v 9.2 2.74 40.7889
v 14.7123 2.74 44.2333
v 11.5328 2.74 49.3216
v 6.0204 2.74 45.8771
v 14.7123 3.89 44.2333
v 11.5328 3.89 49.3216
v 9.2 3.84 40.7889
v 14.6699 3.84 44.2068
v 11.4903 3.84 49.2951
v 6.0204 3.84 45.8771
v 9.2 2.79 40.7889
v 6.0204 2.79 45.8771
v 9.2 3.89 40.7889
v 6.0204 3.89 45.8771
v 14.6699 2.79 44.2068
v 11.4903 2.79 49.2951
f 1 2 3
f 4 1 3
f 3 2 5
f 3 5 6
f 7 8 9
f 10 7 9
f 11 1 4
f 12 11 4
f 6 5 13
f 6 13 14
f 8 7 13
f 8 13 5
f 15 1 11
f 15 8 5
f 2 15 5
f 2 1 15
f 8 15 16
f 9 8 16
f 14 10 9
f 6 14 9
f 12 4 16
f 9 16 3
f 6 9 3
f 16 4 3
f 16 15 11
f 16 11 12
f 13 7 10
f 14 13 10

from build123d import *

# Parameters (mm, degrees)
BOX163_W               = 6
BOX163_H               = 6.45
BOX163_DEPTH           = 1.05
BOX162_W               = 6
BOX162_H               = 6.5
BOX162_DEPTH           = 1.15
CUT079_ROLL_ANGLE      = 90
CUT079_PITCH_ANGLE     = -58
CUT079_PLACEMENT_ANGLE = 180


with BuildPart() as small_cu_gnd_electrode068:
    # Box163 → Box163 (new body)
    with BuildSketch(Plane.XY.offset(0.05)):
        with Locations((3, 3.225)):
            Rectangle(BOX163_W, BOX163_H)
    extrude(amount=BOX163_DEPTH)


with BuildPart() as small_cu_electrode002_short_axis_gnd007:
    # Box162 → Box162 (new body)
    with BuildSketch(Plane.XY):
        with Locations((3, 3.25)):
            Rectangle(BOX162_W, BOX162_H)
    extrude(amount=BOX162_DEPTH)

    # Cut079: cut Small Cu GND Electrode068
    add(small_cu_gnd_electrode068.part, mode=Mode.SUBTRACT)


with BuildPart() as small_cu_electrode002_short_axis_gnd007_1:
    # Cut079 roll: moved
    add(small_cu_electrode002_short_axis_gnd007.part.rotate(Axis((0, 0, 0), (1, 0, 0)), CUT079_ROLL_ANGLE))


with BuildPart() as small_cu_electrode002_short_axis_gnd007_2:
    # Cut079 pitch: moved
    add(small_cu_electrode002_short_axis_gnd007_1.part.rotate(Axis((0, 0, 0), (0, 1, 0)), CUT079_PITCH_ANGLE))


with BuildPart() as small_cu_electrode002_short_axis_gnd007_3:
    # Cut079 placement: moved
    add(small_cu_electrode002_short_axis_gnd007_2.part.moved(Location((9.199953, 2.74, 40.788858))).rotate(Axis((9.199953, 2.74, 40.788858), (0, 0, 1)), CUT079_PLACEMENT_ANGLE))


solid = small_cu_electrode002_short_axis_gnd007_3.part
